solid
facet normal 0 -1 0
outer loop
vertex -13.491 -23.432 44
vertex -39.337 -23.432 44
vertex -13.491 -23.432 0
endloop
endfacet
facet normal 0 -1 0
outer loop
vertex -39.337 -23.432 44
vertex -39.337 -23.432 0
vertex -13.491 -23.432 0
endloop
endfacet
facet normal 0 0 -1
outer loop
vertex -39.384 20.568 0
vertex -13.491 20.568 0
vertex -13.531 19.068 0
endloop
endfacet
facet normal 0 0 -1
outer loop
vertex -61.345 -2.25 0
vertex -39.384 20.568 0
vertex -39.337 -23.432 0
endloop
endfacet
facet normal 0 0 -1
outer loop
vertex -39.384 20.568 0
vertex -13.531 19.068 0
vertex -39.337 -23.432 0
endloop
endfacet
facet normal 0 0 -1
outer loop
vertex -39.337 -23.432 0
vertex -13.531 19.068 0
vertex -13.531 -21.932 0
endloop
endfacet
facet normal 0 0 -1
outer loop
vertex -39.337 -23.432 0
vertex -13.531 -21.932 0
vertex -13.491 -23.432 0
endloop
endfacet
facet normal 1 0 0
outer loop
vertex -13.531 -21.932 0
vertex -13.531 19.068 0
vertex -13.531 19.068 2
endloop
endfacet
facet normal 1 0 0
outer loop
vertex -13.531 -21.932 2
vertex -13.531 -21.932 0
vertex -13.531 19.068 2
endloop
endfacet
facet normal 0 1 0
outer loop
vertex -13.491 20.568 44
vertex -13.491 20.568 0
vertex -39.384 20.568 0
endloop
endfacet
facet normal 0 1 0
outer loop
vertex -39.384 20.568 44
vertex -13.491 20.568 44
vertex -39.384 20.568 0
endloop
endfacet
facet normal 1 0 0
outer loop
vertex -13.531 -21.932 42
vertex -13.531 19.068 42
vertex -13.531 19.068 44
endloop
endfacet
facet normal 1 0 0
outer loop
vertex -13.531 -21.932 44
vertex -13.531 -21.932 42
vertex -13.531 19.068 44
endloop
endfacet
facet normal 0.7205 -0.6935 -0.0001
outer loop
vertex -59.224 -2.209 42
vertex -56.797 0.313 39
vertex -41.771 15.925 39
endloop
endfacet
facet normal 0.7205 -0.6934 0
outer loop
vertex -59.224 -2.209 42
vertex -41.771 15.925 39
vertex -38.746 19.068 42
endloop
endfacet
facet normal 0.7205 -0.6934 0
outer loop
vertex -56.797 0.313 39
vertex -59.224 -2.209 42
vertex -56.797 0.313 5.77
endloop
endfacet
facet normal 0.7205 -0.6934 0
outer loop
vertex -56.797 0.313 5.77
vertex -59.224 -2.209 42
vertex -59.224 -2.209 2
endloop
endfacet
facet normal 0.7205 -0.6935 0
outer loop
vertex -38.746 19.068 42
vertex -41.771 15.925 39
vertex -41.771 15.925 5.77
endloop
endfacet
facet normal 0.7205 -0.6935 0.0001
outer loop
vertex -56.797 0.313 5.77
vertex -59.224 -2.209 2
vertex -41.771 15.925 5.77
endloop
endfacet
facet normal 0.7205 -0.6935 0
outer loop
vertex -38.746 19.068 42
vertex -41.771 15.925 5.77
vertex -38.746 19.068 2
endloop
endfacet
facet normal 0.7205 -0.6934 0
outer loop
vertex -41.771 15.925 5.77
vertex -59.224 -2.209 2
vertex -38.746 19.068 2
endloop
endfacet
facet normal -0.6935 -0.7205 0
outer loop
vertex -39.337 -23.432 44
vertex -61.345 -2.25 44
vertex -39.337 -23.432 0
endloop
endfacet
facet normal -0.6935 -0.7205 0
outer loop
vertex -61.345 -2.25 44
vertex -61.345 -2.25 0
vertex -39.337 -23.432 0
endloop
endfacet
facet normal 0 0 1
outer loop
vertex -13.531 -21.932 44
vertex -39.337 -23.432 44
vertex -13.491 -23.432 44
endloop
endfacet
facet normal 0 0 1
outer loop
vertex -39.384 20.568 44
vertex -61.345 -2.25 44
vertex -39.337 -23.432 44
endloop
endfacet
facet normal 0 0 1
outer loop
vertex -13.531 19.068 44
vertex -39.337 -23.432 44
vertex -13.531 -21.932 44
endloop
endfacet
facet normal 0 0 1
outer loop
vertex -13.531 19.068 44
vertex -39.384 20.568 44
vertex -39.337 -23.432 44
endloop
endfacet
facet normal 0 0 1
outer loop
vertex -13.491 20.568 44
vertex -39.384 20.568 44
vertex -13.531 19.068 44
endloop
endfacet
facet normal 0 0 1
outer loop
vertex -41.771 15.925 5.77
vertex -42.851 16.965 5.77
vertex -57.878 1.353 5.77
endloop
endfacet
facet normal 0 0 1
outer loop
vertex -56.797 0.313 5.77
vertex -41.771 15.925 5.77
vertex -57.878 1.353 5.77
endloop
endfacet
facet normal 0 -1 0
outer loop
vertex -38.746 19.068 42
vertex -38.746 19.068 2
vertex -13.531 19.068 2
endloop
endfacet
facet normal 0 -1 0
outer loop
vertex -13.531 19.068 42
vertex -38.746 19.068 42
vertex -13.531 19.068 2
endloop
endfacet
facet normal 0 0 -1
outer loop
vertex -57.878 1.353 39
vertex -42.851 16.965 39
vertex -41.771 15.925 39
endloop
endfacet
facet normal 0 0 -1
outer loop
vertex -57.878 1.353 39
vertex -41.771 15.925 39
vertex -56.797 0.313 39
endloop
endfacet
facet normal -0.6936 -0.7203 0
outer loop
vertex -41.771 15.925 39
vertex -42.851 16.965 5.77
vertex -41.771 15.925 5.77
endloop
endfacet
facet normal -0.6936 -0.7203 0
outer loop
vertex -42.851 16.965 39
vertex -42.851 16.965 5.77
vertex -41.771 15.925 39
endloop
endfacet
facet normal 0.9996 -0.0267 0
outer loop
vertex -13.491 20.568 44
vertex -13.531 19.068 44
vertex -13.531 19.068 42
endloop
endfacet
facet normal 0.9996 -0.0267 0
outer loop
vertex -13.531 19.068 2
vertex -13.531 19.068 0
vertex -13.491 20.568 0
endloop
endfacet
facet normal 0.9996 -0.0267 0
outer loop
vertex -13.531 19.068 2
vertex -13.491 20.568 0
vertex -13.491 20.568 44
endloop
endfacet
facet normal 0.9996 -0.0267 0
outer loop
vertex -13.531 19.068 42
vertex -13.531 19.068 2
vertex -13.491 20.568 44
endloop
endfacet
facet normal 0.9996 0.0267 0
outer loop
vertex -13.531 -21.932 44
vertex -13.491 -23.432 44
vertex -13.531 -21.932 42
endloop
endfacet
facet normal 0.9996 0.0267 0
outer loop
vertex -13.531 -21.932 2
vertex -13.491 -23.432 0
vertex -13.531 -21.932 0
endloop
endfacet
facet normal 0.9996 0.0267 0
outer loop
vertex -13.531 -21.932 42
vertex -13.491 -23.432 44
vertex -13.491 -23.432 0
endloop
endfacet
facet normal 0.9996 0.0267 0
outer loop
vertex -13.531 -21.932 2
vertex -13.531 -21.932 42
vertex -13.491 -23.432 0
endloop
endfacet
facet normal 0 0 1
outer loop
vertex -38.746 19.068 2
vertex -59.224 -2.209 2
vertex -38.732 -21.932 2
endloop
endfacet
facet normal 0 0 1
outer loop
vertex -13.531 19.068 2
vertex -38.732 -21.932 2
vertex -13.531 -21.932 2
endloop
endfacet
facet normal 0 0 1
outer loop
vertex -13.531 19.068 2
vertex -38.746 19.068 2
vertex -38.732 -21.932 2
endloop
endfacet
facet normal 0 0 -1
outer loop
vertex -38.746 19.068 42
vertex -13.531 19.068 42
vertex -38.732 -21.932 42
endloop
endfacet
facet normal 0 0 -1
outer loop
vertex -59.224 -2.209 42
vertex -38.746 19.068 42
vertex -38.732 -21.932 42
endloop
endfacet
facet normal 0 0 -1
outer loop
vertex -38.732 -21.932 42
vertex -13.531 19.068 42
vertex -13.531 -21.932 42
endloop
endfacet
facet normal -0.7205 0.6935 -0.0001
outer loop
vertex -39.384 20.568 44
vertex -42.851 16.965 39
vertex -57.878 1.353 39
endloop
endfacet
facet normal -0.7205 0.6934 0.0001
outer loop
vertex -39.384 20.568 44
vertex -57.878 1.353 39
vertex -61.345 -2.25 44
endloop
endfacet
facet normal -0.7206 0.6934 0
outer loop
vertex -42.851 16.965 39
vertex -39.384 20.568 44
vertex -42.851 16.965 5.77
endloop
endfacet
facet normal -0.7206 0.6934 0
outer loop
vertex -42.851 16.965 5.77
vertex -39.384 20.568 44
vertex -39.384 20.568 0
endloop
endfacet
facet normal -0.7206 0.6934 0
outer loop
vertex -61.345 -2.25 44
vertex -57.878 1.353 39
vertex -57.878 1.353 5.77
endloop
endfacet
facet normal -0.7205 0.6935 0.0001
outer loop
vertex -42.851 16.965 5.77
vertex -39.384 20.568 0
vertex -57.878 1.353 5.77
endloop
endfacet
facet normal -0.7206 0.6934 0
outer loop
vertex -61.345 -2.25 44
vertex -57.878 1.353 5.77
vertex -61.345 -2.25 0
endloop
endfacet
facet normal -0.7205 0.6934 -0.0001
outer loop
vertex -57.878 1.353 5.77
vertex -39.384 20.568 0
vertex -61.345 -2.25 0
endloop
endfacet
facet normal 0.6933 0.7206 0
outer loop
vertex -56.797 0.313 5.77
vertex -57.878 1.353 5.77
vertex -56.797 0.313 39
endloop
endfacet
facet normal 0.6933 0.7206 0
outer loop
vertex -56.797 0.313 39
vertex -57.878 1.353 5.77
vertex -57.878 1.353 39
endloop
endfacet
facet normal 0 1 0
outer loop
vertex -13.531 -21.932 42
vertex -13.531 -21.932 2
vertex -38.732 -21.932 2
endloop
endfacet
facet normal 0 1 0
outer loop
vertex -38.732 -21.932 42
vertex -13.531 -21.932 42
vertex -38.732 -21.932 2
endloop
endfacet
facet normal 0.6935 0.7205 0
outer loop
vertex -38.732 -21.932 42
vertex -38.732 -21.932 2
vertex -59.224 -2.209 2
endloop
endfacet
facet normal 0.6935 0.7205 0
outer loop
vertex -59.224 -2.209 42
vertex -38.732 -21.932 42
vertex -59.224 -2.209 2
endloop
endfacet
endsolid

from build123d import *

# Parameters (mm, degrees)
F1_DEPTH  = 40
F2_DEPTH  = 2
F3_DEPTH  = 2
F4_W      = 25.2149685806
F4_H      = 2
F5_DEPTH  = 42.1
F5_FACE_W = 40.9870653462
F5_FACE_H = 2
F7_W      = 25.2149685806
F7_H      = 2
F8_DEPTH  = 42
F8_FACE_W = 40.9870653462
F8_FACE_H = 2
F10_W     = 21.6691600519
F10_H     = 33.2297814414
F11_DEPTH = 5.3


with BuildPart() as f1:
    # F0 (on Top) → F1 (new body)
    with BuildSketch(Plane.XY):
        Polygon((-13.4906232357, 20.567771814), (-24.4906232357, 20.567771814), (-39.384083382, 20.567771814), (-61.3453843386, -2.2496986568), (-39.33704599, -23.432228186), (-13.4906232357, -23.432228186), (-13.530928939, -21.9322283479), (-38.732458267, -21.9322283479), (-59.2244518674, -2.2091464562), (-38.7458975196, 19.0677719759), (-24.530928939, 19.0677719759), (-13.530928939, 19.0677719759), align=None)
    extrude(amount=F1_DEPTH)

    # F2 (add): a face of the model
    f2_faces = [f1.faces().sort_by_distance(p)[0] for p in [
        (-49.4292616832, -12.5390688822, 40),
    ]]
    extrude(f2_faces, amount=F2_DEPTH)

    # F3 (add): a face of the model
    f3_faces = [f1.faces().sort_by_distance(p)[0] for p in [
        (-49.4292616832, -12.5390688822, 42),
    ]]
    extrude(f3_faces, amount=F3_DEPTH)

    # F4 (on face) → F5 (join)
    with BuildSketch(Plane.XZ.offset(-19.0677719759)):
        with Locations((-26.1384132293, 43)):
            Rectangle(F4_W, F4_H)
    extrude(amount=F5_DEPTH)

    # F5_face (on face) → F6 (join, up to the next surface of F1)
    with BuildSketch(Plane(origin=(-38.7458975196, -1.4257606972, 43), x_dir=(0, -1, 0), z_dir=(-1, 0, 0))):
        Rectangle(F5_FACE_W, F5_FACE_H)
    extrude(until=Until.NEXT)

    # F7 (on face) → F8 (join)
    with BuildSketch(Plane.XZ.offset(-19.0677719759)):
        with Locations((-26.1384132293, 1)):
            Rectangle(F7_W, F7_H)
    extrude(amount=F8_DEPTH)

    # F8_face (on face) → F9 (join, up to the next surface of F1)
    with BuildSketch(Plane(origin=(-38.7458975196, -1.4257606972, 1), x_dir=(0, -1, 0), z_dir=(-1, 0, 0))):
        Rectangle(F8_FACE_W, F8_FACE_H)
    extrude(until=Until.NEXT)

    # F10 (on face) → F11 (cut)
    with BuildSketch(Plane(origin=(-30.7211592709, 29.5684232548, 0), x_dir=(-0.6934601651, -0.7204949684, 0), z_dir=(-0.7204949684, 0.6934601651, 0))):
        with Locations((28.3268968852, 22.3851092793)):
            Rectangle(F10_W, F10_H)
    extrude(amount=-F11_DEPTH, mode=Mode.SUBTRACT)


solid = f1.part
